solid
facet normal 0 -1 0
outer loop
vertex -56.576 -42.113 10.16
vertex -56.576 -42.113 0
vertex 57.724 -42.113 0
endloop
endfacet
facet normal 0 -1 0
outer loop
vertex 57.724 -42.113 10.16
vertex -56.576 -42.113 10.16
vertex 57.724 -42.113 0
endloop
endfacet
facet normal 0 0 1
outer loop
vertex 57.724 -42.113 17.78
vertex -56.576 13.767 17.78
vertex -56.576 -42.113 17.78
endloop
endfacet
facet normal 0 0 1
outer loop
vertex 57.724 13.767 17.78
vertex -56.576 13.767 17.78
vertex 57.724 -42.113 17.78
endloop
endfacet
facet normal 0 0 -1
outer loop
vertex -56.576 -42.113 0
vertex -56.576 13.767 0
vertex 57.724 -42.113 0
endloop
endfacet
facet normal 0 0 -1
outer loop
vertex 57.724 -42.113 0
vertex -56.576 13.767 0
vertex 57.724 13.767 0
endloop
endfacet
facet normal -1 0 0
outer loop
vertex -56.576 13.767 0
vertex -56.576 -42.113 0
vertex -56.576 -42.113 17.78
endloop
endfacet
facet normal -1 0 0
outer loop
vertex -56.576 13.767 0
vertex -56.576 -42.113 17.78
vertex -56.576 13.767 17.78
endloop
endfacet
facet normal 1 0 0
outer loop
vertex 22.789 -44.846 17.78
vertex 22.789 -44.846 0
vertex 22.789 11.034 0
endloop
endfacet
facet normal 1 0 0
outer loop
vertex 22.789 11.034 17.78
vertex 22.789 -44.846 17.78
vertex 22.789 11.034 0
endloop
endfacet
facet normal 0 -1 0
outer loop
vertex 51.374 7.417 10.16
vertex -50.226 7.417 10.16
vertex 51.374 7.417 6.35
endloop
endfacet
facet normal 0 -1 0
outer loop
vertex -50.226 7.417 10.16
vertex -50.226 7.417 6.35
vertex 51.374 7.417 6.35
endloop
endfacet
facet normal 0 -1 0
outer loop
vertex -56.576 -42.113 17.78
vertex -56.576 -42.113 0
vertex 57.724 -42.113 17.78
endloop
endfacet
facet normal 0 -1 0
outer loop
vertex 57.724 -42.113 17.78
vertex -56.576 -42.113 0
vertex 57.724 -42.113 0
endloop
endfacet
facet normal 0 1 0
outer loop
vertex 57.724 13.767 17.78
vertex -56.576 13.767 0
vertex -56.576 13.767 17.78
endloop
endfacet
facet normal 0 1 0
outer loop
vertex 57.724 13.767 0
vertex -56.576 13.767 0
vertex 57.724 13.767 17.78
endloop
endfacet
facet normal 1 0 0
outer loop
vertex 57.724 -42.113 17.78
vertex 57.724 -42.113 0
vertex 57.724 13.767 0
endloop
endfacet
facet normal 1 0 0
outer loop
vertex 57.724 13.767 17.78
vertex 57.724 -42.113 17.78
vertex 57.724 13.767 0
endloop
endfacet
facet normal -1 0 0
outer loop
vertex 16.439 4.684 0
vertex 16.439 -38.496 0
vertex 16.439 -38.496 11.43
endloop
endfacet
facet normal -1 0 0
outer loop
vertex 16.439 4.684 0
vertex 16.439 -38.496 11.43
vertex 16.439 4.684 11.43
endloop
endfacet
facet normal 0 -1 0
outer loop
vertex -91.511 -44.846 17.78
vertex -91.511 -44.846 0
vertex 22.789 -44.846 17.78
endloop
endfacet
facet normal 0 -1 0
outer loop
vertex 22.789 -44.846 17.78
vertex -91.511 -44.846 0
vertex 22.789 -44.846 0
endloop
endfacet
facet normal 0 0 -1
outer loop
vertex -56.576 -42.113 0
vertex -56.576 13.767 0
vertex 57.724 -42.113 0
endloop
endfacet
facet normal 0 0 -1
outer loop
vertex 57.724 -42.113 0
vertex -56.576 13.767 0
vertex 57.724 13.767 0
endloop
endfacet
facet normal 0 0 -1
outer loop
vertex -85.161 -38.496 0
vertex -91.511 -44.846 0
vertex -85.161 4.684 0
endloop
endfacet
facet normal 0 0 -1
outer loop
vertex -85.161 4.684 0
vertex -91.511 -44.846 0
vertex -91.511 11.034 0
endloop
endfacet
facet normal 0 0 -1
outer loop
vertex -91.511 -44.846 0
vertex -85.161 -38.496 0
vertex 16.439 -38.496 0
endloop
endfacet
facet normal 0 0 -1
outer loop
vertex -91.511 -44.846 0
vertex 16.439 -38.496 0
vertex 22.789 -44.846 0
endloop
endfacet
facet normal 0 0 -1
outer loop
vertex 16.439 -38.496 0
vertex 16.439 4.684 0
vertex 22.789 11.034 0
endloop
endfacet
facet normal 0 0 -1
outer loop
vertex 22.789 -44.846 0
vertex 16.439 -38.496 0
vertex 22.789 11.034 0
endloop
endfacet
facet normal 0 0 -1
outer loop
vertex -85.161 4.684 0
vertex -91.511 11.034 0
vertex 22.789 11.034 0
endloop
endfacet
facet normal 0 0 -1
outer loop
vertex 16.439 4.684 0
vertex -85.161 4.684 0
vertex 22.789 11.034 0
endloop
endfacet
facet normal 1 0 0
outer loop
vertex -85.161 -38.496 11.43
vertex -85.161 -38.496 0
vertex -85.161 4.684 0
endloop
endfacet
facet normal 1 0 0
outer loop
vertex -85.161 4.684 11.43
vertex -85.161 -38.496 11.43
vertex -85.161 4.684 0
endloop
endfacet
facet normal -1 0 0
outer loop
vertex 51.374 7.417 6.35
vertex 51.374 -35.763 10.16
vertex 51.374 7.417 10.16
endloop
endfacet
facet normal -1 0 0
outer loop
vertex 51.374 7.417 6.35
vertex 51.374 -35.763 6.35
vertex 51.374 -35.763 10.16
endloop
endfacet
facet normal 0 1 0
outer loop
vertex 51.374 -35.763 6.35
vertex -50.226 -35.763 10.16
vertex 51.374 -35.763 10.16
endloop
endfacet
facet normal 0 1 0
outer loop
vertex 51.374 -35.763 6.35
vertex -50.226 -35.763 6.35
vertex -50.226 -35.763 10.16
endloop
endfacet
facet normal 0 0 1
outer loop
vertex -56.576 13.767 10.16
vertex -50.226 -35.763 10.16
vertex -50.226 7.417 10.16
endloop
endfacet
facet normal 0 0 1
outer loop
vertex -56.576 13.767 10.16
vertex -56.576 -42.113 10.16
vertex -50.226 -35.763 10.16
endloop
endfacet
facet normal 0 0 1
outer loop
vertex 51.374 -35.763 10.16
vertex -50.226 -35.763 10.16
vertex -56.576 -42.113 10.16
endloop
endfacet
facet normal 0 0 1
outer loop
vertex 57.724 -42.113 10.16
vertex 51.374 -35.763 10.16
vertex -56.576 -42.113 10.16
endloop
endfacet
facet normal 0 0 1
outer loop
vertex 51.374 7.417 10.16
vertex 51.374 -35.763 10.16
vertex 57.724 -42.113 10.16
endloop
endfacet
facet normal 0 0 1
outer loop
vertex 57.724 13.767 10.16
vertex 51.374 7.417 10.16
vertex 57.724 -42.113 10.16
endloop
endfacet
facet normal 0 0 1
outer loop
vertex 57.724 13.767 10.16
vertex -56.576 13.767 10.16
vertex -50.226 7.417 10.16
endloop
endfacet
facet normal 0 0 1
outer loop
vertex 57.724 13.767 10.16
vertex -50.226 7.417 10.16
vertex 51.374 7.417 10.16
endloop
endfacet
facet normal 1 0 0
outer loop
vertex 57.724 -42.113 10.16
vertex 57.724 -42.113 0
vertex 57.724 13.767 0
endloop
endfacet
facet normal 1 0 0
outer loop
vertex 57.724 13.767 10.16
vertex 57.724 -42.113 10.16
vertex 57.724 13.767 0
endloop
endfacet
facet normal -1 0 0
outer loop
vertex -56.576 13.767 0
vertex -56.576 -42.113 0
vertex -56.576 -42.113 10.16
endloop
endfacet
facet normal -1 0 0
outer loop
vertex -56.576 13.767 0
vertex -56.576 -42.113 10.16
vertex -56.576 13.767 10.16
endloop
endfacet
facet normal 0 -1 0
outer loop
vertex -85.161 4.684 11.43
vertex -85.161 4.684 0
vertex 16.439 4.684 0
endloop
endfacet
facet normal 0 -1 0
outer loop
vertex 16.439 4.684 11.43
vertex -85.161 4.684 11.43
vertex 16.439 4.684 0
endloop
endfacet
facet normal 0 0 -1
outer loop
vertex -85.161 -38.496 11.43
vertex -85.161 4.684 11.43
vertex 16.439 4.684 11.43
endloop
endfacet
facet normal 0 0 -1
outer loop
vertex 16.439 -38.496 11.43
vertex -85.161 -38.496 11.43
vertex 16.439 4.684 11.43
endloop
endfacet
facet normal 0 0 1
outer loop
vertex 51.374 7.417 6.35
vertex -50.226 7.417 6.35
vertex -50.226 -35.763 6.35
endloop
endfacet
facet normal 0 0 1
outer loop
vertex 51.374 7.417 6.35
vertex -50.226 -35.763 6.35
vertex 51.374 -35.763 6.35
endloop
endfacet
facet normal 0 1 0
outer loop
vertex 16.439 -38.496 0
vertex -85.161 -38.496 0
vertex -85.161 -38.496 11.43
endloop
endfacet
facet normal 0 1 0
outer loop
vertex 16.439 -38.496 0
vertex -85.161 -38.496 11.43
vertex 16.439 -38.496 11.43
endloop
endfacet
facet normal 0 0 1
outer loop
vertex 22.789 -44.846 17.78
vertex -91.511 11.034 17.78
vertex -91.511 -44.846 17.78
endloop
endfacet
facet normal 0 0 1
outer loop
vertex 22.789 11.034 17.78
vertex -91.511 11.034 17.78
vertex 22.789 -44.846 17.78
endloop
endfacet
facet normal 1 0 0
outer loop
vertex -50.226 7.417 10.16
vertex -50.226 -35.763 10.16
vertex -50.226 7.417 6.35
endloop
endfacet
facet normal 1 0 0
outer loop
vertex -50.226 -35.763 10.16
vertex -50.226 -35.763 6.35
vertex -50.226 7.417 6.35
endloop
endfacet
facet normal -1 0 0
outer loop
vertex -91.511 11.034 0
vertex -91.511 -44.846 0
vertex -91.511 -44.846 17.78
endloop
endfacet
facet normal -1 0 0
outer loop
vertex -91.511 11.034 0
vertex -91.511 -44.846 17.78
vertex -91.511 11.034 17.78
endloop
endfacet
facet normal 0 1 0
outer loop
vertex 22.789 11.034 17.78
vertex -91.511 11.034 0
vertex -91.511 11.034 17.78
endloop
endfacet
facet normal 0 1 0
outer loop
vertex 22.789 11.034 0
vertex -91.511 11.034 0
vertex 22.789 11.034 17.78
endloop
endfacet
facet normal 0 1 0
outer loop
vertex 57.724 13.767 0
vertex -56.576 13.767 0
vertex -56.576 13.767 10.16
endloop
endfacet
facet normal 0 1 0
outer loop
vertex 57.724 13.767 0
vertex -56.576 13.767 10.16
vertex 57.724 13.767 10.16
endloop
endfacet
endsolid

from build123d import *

# Parameters (mm, degrees)
F0_W     = 114.3
F0_H     = 55.88
F1_DEPTH = 10.16
F2_W     = 114.3
F2_H     = 55.88
F3_DEPTH = 17.78
F4_T     = -6.35
F5_T     = -6.35


with BuildPart() as f1:
    # F0 (on Top) → F1 (new body)
    with BuildSketch(Plane.XY):
        with Locations((0.5737692118, -14.1728672351)):
            Rectangle(F0_W, F0_H)
    extrude(amount=F1_DEPTH)

    # F5
    f5_openings = [f1.faces().sort_by_distance(p)[0] for p in [
        (0.573769, -14.172867, 10.16),
    ]]
    offset(amount=F5_T, openings=f5_openings)


with BuildPart() as f3:
    # F2 (on Top) → F3 (new body)
    with BuildSketch(Plane.XY):
        with Locations((-34.3610338222, -16.905572731)):
            Rectangle(F2_W, F2_H)
    extrude(amount=F3_DEPTH)

    # F4
    f4_openings = [f3.faces().sort_by_distance(p)[0] for p in [
        (-34.361034, -16.905573, 0),
    ]]
    offset(amount=F4_T, openings=f4_openings)


with BuildPart() as f3b:
    # F0 (on Top) → F3, piece 2 (new body)
    with BuildSketch(Plane.XY):
        with Locations((0.5737692118, -14.1728672351)):
            Rectangle(F0_W, F0_H)
    extrude(amount=F3_DEPTH)


solid = Compound([f1.part, f3.part, f3b.part])
